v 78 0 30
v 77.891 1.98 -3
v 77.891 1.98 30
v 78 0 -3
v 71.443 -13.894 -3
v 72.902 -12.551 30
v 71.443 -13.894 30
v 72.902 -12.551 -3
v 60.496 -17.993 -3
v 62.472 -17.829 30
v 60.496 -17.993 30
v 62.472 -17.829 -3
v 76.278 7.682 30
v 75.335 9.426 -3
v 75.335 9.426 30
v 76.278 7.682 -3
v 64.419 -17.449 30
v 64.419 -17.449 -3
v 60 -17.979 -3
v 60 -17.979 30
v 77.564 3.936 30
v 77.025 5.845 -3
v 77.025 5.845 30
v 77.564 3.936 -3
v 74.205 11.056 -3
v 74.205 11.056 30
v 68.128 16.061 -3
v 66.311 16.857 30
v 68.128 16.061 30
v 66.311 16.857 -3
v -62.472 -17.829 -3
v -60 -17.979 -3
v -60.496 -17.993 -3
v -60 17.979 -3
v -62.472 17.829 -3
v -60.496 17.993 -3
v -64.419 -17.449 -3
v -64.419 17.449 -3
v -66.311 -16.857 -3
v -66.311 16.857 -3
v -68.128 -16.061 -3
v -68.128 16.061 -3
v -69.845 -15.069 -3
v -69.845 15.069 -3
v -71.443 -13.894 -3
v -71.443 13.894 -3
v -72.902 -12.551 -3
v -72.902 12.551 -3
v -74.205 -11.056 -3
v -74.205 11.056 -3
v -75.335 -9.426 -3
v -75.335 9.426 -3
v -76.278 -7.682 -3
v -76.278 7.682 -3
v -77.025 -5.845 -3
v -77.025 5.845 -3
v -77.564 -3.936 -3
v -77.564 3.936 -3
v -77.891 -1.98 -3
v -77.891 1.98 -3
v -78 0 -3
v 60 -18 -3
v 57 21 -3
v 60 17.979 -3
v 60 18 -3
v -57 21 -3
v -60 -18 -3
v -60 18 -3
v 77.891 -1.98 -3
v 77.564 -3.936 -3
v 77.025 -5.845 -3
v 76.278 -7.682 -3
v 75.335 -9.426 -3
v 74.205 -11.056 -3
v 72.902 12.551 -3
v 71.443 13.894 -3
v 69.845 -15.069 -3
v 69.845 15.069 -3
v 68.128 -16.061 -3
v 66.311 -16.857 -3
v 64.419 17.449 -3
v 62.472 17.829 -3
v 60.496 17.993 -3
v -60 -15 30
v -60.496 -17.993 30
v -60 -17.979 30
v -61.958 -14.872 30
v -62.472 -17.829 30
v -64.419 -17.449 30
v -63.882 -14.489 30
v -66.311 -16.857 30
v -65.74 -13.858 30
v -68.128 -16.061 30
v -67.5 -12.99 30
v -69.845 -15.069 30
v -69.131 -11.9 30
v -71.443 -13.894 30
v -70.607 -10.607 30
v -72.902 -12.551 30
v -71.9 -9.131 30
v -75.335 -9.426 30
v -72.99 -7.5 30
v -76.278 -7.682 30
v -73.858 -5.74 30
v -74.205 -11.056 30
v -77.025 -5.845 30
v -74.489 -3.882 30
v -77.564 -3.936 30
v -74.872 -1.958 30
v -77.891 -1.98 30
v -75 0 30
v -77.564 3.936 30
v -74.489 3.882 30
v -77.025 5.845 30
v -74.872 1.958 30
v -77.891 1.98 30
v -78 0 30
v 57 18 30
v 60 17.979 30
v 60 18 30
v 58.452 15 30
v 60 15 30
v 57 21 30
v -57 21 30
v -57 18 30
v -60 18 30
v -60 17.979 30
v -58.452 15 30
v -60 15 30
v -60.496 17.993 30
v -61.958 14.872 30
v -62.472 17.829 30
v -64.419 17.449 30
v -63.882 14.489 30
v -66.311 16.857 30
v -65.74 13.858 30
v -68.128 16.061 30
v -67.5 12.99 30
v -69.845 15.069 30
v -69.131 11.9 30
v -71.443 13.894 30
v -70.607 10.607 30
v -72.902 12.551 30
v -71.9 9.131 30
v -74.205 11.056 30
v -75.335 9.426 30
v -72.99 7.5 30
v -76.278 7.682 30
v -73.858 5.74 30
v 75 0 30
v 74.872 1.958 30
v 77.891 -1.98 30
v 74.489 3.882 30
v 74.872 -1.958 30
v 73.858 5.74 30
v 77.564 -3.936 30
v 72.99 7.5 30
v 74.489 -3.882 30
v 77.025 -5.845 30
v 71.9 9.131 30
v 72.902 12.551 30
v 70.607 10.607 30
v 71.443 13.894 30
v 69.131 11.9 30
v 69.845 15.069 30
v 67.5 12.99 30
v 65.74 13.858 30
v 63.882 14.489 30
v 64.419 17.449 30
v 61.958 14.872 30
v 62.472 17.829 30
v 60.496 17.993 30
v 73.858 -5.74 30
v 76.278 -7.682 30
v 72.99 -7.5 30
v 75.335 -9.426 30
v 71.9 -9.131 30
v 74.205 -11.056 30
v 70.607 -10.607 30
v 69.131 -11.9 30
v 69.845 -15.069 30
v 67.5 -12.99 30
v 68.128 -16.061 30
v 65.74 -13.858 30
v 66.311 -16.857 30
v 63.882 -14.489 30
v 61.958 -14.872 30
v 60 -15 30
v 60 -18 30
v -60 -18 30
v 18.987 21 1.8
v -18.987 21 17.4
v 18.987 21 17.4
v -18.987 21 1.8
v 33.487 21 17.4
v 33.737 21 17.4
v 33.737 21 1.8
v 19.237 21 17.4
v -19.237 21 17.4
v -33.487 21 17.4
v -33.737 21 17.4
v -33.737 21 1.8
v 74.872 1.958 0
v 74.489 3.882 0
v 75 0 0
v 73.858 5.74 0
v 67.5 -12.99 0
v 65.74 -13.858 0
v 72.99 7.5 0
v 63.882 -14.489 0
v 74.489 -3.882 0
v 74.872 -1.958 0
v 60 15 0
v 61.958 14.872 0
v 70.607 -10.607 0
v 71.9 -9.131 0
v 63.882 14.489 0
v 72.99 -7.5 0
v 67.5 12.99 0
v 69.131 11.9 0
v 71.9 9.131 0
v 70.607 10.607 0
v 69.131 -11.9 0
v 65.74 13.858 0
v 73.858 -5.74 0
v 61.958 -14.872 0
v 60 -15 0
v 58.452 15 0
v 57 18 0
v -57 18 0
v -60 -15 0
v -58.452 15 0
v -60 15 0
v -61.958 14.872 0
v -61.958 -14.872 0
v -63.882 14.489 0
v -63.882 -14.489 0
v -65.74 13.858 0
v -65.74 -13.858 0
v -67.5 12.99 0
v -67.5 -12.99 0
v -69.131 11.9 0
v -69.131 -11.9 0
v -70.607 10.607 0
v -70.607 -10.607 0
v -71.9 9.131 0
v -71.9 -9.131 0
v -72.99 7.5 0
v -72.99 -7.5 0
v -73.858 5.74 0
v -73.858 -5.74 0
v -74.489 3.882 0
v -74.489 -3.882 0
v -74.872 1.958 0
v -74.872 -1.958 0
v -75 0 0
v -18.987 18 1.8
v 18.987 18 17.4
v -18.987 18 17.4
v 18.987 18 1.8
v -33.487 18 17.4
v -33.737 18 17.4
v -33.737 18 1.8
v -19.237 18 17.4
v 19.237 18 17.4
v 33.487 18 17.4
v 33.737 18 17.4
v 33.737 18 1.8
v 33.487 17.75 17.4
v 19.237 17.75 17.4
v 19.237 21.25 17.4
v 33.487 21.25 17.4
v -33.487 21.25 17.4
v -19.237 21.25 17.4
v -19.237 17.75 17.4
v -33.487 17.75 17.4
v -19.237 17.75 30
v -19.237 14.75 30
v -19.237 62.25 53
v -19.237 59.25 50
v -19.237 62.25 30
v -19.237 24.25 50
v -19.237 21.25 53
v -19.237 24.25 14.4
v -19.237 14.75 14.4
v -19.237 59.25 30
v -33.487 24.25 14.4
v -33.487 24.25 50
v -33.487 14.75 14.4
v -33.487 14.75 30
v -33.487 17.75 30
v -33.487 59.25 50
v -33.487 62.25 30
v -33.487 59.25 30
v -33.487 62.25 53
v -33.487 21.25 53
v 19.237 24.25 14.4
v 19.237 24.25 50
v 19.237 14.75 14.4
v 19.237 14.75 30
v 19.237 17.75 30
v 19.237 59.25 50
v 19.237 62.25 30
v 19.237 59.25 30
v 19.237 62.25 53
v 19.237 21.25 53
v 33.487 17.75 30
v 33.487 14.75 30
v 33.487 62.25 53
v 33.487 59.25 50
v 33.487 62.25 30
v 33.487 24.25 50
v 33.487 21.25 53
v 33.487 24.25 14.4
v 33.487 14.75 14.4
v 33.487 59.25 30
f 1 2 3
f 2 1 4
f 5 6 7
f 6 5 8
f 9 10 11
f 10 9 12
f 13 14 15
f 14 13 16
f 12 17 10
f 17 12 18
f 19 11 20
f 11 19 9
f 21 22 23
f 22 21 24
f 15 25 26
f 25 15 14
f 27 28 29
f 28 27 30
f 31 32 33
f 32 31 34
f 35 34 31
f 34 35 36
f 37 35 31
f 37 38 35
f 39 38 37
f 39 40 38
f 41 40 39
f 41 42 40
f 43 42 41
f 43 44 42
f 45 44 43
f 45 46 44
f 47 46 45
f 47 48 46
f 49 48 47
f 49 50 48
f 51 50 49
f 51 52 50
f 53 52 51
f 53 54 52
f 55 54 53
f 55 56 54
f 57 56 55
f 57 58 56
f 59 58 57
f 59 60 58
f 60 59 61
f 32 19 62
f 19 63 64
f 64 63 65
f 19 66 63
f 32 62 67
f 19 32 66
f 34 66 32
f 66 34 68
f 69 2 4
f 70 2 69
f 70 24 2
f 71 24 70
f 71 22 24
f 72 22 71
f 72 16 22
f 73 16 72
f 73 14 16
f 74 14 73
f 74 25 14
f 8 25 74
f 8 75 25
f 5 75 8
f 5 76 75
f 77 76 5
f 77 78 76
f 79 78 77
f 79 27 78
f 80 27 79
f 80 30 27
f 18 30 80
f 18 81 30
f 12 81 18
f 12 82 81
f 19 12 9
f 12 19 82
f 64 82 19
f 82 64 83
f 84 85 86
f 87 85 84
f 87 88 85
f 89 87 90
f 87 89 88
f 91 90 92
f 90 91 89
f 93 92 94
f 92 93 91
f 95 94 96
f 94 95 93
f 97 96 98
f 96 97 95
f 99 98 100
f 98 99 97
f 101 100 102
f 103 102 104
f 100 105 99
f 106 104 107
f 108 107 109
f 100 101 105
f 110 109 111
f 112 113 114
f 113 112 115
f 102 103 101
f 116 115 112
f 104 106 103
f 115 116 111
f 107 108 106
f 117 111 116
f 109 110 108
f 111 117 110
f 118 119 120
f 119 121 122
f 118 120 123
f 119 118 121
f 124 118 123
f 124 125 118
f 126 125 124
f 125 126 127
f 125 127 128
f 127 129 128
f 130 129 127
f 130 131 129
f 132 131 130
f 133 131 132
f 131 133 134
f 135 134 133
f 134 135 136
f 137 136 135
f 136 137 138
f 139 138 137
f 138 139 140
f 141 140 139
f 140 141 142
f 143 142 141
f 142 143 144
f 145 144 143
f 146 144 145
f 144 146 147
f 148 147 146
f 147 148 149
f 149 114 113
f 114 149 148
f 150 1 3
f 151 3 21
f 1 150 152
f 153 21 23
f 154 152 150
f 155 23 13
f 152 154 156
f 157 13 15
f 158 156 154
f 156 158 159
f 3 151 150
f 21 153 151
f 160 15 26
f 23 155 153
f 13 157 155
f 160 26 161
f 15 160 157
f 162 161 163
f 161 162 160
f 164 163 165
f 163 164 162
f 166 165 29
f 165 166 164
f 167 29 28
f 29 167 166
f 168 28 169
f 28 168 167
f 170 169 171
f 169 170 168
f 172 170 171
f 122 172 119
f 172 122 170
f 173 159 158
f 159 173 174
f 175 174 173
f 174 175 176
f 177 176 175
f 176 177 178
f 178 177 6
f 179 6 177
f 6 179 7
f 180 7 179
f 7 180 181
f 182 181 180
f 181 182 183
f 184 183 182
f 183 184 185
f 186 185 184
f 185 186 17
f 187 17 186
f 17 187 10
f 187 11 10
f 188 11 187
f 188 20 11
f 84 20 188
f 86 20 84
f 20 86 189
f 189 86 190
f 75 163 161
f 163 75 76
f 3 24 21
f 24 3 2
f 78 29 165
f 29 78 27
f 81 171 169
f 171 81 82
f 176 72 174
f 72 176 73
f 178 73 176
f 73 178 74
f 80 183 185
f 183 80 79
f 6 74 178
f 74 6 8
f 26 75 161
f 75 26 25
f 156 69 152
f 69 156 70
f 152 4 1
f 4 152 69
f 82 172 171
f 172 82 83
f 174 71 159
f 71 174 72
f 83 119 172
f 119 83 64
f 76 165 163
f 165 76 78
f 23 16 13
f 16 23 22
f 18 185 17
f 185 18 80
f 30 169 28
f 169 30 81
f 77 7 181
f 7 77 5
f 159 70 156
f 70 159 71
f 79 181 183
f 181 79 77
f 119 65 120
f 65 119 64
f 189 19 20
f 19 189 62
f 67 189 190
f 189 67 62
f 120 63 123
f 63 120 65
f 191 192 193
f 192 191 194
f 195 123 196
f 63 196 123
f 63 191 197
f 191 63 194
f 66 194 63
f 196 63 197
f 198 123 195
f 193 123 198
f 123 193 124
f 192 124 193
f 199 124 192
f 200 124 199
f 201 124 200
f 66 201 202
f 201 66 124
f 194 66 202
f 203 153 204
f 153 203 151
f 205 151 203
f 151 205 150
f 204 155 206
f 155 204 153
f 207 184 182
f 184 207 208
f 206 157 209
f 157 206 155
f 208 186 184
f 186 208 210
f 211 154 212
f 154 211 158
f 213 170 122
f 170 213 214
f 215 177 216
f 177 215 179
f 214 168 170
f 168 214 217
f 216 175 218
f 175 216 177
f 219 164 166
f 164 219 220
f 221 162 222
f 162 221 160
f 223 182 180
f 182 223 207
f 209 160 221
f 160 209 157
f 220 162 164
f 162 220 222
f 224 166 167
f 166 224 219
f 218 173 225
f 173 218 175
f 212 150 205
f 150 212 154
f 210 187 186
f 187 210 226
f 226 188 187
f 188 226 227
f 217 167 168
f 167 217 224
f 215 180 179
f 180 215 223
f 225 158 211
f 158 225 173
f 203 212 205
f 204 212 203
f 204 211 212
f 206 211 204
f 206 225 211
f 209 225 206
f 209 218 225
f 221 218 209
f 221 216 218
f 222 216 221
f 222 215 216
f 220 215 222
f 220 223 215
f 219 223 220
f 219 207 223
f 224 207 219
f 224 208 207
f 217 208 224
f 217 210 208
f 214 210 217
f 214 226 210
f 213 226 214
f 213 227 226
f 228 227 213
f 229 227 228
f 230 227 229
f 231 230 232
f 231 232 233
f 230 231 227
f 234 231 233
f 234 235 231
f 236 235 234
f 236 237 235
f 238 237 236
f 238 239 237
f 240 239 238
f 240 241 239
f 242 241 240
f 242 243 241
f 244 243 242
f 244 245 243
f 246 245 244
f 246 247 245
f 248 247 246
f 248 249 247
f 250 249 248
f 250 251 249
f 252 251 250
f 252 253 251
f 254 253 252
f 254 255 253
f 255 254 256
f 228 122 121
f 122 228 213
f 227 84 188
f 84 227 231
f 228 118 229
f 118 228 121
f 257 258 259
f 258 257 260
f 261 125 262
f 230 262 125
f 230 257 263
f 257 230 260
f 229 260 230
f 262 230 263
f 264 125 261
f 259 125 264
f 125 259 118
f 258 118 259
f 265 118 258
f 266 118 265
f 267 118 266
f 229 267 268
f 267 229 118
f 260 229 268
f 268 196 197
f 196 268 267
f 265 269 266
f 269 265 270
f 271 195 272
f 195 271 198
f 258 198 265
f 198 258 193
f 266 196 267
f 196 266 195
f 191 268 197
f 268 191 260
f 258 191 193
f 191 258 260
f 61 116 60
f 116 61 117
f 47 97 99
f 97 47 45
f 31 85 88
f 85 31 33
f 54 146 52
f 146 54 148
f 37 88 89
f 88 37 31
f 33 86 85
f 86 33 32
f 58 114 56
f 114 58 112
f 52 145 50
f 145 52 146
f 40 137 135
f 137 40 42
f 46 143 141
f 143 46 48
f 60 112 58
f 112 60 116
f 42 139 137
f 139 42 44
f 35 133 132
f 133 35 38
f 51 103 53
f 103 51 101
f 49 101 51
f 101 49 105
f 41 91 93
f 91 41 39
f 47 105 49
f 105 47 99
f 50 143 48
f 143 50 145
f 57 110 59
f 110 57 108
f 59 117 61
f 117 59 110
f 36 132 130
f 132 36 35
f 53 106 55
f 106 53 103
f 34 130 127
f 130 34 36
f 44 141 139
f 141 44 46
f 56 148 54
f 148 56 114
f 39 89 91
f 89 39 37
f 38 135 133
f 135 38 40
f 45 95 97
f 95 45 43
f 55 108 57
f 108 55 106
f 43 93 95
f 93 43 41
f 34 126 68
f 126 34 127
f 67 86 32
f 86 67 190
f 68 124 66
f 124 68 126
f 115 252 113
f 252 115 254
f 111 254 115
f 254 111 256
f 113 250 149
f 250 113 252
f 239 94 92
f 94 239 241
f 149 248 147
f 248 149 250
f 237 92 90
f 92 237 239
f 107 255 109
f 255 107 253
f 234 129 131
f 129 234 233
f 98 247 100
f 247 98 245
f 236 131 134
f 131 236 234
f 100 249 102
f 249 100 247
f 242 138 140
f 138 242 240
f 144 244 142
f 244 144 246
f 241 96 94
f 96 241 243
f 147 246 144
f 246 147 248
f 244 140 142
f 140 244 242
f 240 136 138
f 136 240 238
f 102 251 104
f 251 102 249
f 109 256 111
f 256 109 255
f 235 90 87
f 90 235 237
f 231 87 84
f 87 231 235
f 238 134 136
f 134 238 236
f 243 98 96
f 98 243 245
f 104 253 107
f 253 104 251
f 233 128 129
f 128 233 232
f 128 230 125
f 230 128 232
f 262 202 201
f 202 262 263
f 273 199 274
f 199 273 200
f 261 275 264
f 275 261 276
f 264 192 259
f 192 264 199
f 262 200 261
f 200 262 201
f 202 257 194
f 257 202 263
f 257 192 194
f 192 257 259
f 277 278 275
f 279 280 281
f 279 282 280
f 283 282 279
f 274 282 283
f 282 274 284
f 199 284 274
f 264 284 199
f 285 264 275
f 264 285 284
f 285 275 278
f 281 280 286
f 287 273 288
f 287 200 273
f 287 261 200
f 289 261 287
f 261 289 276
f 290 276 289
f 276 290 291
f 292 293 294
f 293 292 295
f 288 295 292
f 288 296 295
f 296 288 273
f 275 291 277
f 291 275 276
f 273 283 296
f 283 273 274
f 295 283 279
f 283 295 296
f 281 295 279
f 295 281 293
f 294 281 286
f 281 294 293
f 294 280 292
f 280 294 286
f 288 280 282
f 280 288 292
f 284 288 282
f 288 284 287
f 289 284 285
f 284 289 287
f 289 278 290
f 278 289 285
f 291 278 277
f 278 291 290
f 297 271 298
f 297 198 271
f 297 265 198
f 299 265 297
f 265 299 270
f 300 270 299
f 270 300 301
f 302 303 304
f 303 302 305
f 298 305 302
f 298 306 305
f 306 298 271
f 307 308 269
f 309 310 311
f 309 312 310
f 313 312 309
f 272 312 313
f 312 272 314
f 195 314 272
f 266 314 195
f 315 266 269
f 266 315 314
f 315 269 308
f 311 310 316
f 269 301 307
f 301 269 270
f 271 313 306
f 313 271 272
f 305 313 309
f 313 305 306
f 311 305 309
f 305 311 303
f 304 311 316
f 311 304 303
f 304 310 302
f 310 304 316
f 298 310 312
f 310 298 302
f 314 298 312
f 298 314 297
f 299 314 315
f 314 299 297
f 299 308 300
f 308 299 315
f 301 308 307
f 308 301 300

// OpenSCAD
part = "ViewAssy"; // [ViewAssy:Assy,Holder:Holder,Bracket1:Bracket1,Bracket2:Bracket2]

/* [Basic] */
width = 150;
depth = 30;
height = 30;
hold_target=35;

/* [Thikness] */
thikness = 3;   //  [1:15]
Brackt_thikness =3;   //  [2:15]

/* [Bracket] */
bracket_connect_h_ratio = 42; //[10:100]
bracket_connect_h = height*bracket_connect_h_ratio/100.0;
over_h = 20;        //  [0:200]
hold_h=20;     //  [1:1000]

/* [Bracket width] */
// White : Sigle , Red : Cannot Travel
b_width_ratio = 25;   //  [10:100]
b_width = ((width-depth)/2-Brackt_thikness)*b_width_ratio/100;
b_x_offset_max =  (width-depth)/2-Brackt_thikness-b_width;

// White : Sigle ,Red : Cannot Bridge
b_x_offset_rate = 45 ;  // [0:100]
b_x_offset = b_x_offset_max  * b_x_offset_rate/100.0 ;

//Printer Setting
BridgeLengthMax = 40;

/* [Other] */
Clearance=0.5;   
MinAngle = 2;     // [1:10]

/* [Hidden] */
bxm = -Clearance;
bx0 = 0;
bx1 = Brackt_thikness ;
bx2 = bx1 + Brackt_thikness + Clearance;
bx3 = bx2 + Brackt_thikness ;
bx4 = bx3 + hold_target;
bx5 = bx4 + Brackt_thikness ;

bh0 = height;
bh1 = height-bracket_connect_h;
bh2 = bh1-Brackt_thikness;
bh3 = bh0 + over_h + Brackt_thikness;
bh4 = bh0 + over_h;
bh5 = bh4 - hold_h;

bh6 = bh1 - ( bh0 - bh2 );

module bracketBase(width){
    linear_extrude(height = width,  convexity = 10)
    polygon(points=[
      [bh0,bx0],   // 0
      [bh0,bx1],   // 1
      [bh1,bx1],   // 2
      [bh1,bx2],   // 3 
      [bh3,bx2],   // 4 
      [bh3,bx5],   // 5
      [bh5,bx5],   // 6
      [bh5,bx4],   // 7
      [bh4,bx4],   // 8
      [bh4,bx3],   // 9
      [bh2,bx3],   //10
      [bh2,bx0],   //11
      ]);
}


module bracket(){
  translate([-b_x_offset/*+Clearance/2*/,depth/2-Clearance/2,0])
  color("Yellow")
  rotate(270,[0,1,0])
  bracketBase(b_width);
}

module sideHolder (){
  render()difference(){
    union(){
      translate([(width-depth)/2,0,-thikness])
      cylinder(r=depth/2+thikness,h=height+thikness,,$fa=MinAngle);
      translate([(width-depth)/4,0,(height+thikness)/2-thikness])
        cube([(width-depth)/2,depth+thikness*2,height+thikness],center=true);

      translate([0,0,-thikness])
        linear_extrude(height = height+thikness,  convexity = 10)
        polygon(points=[
          [0,depth/2+thikness],[0,depth/2+Brackt_thikness*2],
          [ (width-depth)/2-thikness,depth/2+Brackt_thikness*2],
          [ (width-depth)/2,depth/2+thikness]]);
      
    }

    union(){
      translate([(width-depth)/2,0,0])cylinder(r=depth/2,h=height+1,$fa=MinAngle);
      translate([0,0,height/2+1])cube([width-depth,depth,height+2],center=true);
      
      translate([0,0,0])
        linear_extrude(height = height+1,  convexity = 10)
      polygon(points=[
        [-1,depth/2-0.1],[-1,depth/2+Brackt_thikness],
        [(width-depth)/2-Brackt_thikness*1   ,depth/2+Brackt_thikness],
        [(width-depth)/2-Brackt_thikness*0.5 ,depth/2-0.1]]);
      
      translate([b_width+b_x_offset+Clearance/2,depth/2,0])
      rotate(270,[0,1,0])
        linear_extrude(height = b_width+Clearance,  convexity = 10)
        polygon(points=[
          [bh1,bxm],
          [bh1,bx2],
          [bh6,bx2],
          [bh6,bxm]
          ]);

    }
  }
}

module holder(){
  union(){
    sideHolder();
    mirror(180,[0,0,1])sideHolder();
  }
}

module newcolor()
{
  if(b_width > BridgeLengthMax){
    color("Red") children(); 
  }else if(b_x_offset_rate==0 || b_width_ratio==100){
    if(b_width*2 > BridgeLengthMax){
      color("Red") children(); 
    }else{
     color("LemonChiffon") children(); 
    }
  }else{
    color("GreenYellow") children(); 
  }
}

module print_part() {
  if (part == "ViewAssy") {
    color("Aquamarine")holder();
    newcolor()
      bracket();
    mirror(180,[0,0,1])
      newcolor()
      bracket();
  }else if (part == "Holder") {
    holder();
  }else if(b_x_offset_rate==0 || b_width_ratio==100){ 
    if (part == "Bracket1") {
      bracketBase(b_width*2);
    } else if(part == "Bracket2") {
      linear_extrude(height = 1,  convexity = 10)
      text("Bracket2 is nothing."); 
    }
  }else{
    if (part == "Bracket1") {
      bracketBase(b_width);
    } else if(part == "Bracket2") {
      bracketBase(b_width);
    }
  }
}

print_part();
